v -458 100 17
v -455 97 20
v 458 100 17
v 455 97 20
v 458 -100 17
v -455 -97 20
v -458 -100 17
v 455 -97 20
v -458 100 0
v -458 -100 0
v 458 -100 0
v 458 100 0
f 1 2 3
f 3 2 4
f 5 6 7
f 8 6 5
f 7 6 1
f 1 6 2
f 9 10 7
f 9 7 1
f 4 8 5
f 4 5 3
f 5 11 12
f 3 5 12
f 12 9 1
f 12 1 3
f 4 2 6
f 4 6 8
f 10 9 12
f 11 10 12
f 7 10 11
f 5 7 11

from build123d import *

# Parameters (mm, degrees)
F0_W     = 916
F0_H     = 200
F1_DEPTH = 20
F2_SIZE  = 3


with BuildPart() as f1:
    # F0 (on Top) → F1 (new body)
    with BuildSketch(Plane.XY):
        Rectangle(F0_W, F0_H)
    extrude(amount=F1_DEPTH)

    # F2
    f2_edges = [f1.edges().sort_by_distance(p)[0] for p in [
        (0, 100, 20),
        (-458, 0, 20),
        (0, -100, 20),
        (458, 0, 20),
    ]]
    chamfer(f2_edges, length=F2_SIZE)


solid = f1.part
